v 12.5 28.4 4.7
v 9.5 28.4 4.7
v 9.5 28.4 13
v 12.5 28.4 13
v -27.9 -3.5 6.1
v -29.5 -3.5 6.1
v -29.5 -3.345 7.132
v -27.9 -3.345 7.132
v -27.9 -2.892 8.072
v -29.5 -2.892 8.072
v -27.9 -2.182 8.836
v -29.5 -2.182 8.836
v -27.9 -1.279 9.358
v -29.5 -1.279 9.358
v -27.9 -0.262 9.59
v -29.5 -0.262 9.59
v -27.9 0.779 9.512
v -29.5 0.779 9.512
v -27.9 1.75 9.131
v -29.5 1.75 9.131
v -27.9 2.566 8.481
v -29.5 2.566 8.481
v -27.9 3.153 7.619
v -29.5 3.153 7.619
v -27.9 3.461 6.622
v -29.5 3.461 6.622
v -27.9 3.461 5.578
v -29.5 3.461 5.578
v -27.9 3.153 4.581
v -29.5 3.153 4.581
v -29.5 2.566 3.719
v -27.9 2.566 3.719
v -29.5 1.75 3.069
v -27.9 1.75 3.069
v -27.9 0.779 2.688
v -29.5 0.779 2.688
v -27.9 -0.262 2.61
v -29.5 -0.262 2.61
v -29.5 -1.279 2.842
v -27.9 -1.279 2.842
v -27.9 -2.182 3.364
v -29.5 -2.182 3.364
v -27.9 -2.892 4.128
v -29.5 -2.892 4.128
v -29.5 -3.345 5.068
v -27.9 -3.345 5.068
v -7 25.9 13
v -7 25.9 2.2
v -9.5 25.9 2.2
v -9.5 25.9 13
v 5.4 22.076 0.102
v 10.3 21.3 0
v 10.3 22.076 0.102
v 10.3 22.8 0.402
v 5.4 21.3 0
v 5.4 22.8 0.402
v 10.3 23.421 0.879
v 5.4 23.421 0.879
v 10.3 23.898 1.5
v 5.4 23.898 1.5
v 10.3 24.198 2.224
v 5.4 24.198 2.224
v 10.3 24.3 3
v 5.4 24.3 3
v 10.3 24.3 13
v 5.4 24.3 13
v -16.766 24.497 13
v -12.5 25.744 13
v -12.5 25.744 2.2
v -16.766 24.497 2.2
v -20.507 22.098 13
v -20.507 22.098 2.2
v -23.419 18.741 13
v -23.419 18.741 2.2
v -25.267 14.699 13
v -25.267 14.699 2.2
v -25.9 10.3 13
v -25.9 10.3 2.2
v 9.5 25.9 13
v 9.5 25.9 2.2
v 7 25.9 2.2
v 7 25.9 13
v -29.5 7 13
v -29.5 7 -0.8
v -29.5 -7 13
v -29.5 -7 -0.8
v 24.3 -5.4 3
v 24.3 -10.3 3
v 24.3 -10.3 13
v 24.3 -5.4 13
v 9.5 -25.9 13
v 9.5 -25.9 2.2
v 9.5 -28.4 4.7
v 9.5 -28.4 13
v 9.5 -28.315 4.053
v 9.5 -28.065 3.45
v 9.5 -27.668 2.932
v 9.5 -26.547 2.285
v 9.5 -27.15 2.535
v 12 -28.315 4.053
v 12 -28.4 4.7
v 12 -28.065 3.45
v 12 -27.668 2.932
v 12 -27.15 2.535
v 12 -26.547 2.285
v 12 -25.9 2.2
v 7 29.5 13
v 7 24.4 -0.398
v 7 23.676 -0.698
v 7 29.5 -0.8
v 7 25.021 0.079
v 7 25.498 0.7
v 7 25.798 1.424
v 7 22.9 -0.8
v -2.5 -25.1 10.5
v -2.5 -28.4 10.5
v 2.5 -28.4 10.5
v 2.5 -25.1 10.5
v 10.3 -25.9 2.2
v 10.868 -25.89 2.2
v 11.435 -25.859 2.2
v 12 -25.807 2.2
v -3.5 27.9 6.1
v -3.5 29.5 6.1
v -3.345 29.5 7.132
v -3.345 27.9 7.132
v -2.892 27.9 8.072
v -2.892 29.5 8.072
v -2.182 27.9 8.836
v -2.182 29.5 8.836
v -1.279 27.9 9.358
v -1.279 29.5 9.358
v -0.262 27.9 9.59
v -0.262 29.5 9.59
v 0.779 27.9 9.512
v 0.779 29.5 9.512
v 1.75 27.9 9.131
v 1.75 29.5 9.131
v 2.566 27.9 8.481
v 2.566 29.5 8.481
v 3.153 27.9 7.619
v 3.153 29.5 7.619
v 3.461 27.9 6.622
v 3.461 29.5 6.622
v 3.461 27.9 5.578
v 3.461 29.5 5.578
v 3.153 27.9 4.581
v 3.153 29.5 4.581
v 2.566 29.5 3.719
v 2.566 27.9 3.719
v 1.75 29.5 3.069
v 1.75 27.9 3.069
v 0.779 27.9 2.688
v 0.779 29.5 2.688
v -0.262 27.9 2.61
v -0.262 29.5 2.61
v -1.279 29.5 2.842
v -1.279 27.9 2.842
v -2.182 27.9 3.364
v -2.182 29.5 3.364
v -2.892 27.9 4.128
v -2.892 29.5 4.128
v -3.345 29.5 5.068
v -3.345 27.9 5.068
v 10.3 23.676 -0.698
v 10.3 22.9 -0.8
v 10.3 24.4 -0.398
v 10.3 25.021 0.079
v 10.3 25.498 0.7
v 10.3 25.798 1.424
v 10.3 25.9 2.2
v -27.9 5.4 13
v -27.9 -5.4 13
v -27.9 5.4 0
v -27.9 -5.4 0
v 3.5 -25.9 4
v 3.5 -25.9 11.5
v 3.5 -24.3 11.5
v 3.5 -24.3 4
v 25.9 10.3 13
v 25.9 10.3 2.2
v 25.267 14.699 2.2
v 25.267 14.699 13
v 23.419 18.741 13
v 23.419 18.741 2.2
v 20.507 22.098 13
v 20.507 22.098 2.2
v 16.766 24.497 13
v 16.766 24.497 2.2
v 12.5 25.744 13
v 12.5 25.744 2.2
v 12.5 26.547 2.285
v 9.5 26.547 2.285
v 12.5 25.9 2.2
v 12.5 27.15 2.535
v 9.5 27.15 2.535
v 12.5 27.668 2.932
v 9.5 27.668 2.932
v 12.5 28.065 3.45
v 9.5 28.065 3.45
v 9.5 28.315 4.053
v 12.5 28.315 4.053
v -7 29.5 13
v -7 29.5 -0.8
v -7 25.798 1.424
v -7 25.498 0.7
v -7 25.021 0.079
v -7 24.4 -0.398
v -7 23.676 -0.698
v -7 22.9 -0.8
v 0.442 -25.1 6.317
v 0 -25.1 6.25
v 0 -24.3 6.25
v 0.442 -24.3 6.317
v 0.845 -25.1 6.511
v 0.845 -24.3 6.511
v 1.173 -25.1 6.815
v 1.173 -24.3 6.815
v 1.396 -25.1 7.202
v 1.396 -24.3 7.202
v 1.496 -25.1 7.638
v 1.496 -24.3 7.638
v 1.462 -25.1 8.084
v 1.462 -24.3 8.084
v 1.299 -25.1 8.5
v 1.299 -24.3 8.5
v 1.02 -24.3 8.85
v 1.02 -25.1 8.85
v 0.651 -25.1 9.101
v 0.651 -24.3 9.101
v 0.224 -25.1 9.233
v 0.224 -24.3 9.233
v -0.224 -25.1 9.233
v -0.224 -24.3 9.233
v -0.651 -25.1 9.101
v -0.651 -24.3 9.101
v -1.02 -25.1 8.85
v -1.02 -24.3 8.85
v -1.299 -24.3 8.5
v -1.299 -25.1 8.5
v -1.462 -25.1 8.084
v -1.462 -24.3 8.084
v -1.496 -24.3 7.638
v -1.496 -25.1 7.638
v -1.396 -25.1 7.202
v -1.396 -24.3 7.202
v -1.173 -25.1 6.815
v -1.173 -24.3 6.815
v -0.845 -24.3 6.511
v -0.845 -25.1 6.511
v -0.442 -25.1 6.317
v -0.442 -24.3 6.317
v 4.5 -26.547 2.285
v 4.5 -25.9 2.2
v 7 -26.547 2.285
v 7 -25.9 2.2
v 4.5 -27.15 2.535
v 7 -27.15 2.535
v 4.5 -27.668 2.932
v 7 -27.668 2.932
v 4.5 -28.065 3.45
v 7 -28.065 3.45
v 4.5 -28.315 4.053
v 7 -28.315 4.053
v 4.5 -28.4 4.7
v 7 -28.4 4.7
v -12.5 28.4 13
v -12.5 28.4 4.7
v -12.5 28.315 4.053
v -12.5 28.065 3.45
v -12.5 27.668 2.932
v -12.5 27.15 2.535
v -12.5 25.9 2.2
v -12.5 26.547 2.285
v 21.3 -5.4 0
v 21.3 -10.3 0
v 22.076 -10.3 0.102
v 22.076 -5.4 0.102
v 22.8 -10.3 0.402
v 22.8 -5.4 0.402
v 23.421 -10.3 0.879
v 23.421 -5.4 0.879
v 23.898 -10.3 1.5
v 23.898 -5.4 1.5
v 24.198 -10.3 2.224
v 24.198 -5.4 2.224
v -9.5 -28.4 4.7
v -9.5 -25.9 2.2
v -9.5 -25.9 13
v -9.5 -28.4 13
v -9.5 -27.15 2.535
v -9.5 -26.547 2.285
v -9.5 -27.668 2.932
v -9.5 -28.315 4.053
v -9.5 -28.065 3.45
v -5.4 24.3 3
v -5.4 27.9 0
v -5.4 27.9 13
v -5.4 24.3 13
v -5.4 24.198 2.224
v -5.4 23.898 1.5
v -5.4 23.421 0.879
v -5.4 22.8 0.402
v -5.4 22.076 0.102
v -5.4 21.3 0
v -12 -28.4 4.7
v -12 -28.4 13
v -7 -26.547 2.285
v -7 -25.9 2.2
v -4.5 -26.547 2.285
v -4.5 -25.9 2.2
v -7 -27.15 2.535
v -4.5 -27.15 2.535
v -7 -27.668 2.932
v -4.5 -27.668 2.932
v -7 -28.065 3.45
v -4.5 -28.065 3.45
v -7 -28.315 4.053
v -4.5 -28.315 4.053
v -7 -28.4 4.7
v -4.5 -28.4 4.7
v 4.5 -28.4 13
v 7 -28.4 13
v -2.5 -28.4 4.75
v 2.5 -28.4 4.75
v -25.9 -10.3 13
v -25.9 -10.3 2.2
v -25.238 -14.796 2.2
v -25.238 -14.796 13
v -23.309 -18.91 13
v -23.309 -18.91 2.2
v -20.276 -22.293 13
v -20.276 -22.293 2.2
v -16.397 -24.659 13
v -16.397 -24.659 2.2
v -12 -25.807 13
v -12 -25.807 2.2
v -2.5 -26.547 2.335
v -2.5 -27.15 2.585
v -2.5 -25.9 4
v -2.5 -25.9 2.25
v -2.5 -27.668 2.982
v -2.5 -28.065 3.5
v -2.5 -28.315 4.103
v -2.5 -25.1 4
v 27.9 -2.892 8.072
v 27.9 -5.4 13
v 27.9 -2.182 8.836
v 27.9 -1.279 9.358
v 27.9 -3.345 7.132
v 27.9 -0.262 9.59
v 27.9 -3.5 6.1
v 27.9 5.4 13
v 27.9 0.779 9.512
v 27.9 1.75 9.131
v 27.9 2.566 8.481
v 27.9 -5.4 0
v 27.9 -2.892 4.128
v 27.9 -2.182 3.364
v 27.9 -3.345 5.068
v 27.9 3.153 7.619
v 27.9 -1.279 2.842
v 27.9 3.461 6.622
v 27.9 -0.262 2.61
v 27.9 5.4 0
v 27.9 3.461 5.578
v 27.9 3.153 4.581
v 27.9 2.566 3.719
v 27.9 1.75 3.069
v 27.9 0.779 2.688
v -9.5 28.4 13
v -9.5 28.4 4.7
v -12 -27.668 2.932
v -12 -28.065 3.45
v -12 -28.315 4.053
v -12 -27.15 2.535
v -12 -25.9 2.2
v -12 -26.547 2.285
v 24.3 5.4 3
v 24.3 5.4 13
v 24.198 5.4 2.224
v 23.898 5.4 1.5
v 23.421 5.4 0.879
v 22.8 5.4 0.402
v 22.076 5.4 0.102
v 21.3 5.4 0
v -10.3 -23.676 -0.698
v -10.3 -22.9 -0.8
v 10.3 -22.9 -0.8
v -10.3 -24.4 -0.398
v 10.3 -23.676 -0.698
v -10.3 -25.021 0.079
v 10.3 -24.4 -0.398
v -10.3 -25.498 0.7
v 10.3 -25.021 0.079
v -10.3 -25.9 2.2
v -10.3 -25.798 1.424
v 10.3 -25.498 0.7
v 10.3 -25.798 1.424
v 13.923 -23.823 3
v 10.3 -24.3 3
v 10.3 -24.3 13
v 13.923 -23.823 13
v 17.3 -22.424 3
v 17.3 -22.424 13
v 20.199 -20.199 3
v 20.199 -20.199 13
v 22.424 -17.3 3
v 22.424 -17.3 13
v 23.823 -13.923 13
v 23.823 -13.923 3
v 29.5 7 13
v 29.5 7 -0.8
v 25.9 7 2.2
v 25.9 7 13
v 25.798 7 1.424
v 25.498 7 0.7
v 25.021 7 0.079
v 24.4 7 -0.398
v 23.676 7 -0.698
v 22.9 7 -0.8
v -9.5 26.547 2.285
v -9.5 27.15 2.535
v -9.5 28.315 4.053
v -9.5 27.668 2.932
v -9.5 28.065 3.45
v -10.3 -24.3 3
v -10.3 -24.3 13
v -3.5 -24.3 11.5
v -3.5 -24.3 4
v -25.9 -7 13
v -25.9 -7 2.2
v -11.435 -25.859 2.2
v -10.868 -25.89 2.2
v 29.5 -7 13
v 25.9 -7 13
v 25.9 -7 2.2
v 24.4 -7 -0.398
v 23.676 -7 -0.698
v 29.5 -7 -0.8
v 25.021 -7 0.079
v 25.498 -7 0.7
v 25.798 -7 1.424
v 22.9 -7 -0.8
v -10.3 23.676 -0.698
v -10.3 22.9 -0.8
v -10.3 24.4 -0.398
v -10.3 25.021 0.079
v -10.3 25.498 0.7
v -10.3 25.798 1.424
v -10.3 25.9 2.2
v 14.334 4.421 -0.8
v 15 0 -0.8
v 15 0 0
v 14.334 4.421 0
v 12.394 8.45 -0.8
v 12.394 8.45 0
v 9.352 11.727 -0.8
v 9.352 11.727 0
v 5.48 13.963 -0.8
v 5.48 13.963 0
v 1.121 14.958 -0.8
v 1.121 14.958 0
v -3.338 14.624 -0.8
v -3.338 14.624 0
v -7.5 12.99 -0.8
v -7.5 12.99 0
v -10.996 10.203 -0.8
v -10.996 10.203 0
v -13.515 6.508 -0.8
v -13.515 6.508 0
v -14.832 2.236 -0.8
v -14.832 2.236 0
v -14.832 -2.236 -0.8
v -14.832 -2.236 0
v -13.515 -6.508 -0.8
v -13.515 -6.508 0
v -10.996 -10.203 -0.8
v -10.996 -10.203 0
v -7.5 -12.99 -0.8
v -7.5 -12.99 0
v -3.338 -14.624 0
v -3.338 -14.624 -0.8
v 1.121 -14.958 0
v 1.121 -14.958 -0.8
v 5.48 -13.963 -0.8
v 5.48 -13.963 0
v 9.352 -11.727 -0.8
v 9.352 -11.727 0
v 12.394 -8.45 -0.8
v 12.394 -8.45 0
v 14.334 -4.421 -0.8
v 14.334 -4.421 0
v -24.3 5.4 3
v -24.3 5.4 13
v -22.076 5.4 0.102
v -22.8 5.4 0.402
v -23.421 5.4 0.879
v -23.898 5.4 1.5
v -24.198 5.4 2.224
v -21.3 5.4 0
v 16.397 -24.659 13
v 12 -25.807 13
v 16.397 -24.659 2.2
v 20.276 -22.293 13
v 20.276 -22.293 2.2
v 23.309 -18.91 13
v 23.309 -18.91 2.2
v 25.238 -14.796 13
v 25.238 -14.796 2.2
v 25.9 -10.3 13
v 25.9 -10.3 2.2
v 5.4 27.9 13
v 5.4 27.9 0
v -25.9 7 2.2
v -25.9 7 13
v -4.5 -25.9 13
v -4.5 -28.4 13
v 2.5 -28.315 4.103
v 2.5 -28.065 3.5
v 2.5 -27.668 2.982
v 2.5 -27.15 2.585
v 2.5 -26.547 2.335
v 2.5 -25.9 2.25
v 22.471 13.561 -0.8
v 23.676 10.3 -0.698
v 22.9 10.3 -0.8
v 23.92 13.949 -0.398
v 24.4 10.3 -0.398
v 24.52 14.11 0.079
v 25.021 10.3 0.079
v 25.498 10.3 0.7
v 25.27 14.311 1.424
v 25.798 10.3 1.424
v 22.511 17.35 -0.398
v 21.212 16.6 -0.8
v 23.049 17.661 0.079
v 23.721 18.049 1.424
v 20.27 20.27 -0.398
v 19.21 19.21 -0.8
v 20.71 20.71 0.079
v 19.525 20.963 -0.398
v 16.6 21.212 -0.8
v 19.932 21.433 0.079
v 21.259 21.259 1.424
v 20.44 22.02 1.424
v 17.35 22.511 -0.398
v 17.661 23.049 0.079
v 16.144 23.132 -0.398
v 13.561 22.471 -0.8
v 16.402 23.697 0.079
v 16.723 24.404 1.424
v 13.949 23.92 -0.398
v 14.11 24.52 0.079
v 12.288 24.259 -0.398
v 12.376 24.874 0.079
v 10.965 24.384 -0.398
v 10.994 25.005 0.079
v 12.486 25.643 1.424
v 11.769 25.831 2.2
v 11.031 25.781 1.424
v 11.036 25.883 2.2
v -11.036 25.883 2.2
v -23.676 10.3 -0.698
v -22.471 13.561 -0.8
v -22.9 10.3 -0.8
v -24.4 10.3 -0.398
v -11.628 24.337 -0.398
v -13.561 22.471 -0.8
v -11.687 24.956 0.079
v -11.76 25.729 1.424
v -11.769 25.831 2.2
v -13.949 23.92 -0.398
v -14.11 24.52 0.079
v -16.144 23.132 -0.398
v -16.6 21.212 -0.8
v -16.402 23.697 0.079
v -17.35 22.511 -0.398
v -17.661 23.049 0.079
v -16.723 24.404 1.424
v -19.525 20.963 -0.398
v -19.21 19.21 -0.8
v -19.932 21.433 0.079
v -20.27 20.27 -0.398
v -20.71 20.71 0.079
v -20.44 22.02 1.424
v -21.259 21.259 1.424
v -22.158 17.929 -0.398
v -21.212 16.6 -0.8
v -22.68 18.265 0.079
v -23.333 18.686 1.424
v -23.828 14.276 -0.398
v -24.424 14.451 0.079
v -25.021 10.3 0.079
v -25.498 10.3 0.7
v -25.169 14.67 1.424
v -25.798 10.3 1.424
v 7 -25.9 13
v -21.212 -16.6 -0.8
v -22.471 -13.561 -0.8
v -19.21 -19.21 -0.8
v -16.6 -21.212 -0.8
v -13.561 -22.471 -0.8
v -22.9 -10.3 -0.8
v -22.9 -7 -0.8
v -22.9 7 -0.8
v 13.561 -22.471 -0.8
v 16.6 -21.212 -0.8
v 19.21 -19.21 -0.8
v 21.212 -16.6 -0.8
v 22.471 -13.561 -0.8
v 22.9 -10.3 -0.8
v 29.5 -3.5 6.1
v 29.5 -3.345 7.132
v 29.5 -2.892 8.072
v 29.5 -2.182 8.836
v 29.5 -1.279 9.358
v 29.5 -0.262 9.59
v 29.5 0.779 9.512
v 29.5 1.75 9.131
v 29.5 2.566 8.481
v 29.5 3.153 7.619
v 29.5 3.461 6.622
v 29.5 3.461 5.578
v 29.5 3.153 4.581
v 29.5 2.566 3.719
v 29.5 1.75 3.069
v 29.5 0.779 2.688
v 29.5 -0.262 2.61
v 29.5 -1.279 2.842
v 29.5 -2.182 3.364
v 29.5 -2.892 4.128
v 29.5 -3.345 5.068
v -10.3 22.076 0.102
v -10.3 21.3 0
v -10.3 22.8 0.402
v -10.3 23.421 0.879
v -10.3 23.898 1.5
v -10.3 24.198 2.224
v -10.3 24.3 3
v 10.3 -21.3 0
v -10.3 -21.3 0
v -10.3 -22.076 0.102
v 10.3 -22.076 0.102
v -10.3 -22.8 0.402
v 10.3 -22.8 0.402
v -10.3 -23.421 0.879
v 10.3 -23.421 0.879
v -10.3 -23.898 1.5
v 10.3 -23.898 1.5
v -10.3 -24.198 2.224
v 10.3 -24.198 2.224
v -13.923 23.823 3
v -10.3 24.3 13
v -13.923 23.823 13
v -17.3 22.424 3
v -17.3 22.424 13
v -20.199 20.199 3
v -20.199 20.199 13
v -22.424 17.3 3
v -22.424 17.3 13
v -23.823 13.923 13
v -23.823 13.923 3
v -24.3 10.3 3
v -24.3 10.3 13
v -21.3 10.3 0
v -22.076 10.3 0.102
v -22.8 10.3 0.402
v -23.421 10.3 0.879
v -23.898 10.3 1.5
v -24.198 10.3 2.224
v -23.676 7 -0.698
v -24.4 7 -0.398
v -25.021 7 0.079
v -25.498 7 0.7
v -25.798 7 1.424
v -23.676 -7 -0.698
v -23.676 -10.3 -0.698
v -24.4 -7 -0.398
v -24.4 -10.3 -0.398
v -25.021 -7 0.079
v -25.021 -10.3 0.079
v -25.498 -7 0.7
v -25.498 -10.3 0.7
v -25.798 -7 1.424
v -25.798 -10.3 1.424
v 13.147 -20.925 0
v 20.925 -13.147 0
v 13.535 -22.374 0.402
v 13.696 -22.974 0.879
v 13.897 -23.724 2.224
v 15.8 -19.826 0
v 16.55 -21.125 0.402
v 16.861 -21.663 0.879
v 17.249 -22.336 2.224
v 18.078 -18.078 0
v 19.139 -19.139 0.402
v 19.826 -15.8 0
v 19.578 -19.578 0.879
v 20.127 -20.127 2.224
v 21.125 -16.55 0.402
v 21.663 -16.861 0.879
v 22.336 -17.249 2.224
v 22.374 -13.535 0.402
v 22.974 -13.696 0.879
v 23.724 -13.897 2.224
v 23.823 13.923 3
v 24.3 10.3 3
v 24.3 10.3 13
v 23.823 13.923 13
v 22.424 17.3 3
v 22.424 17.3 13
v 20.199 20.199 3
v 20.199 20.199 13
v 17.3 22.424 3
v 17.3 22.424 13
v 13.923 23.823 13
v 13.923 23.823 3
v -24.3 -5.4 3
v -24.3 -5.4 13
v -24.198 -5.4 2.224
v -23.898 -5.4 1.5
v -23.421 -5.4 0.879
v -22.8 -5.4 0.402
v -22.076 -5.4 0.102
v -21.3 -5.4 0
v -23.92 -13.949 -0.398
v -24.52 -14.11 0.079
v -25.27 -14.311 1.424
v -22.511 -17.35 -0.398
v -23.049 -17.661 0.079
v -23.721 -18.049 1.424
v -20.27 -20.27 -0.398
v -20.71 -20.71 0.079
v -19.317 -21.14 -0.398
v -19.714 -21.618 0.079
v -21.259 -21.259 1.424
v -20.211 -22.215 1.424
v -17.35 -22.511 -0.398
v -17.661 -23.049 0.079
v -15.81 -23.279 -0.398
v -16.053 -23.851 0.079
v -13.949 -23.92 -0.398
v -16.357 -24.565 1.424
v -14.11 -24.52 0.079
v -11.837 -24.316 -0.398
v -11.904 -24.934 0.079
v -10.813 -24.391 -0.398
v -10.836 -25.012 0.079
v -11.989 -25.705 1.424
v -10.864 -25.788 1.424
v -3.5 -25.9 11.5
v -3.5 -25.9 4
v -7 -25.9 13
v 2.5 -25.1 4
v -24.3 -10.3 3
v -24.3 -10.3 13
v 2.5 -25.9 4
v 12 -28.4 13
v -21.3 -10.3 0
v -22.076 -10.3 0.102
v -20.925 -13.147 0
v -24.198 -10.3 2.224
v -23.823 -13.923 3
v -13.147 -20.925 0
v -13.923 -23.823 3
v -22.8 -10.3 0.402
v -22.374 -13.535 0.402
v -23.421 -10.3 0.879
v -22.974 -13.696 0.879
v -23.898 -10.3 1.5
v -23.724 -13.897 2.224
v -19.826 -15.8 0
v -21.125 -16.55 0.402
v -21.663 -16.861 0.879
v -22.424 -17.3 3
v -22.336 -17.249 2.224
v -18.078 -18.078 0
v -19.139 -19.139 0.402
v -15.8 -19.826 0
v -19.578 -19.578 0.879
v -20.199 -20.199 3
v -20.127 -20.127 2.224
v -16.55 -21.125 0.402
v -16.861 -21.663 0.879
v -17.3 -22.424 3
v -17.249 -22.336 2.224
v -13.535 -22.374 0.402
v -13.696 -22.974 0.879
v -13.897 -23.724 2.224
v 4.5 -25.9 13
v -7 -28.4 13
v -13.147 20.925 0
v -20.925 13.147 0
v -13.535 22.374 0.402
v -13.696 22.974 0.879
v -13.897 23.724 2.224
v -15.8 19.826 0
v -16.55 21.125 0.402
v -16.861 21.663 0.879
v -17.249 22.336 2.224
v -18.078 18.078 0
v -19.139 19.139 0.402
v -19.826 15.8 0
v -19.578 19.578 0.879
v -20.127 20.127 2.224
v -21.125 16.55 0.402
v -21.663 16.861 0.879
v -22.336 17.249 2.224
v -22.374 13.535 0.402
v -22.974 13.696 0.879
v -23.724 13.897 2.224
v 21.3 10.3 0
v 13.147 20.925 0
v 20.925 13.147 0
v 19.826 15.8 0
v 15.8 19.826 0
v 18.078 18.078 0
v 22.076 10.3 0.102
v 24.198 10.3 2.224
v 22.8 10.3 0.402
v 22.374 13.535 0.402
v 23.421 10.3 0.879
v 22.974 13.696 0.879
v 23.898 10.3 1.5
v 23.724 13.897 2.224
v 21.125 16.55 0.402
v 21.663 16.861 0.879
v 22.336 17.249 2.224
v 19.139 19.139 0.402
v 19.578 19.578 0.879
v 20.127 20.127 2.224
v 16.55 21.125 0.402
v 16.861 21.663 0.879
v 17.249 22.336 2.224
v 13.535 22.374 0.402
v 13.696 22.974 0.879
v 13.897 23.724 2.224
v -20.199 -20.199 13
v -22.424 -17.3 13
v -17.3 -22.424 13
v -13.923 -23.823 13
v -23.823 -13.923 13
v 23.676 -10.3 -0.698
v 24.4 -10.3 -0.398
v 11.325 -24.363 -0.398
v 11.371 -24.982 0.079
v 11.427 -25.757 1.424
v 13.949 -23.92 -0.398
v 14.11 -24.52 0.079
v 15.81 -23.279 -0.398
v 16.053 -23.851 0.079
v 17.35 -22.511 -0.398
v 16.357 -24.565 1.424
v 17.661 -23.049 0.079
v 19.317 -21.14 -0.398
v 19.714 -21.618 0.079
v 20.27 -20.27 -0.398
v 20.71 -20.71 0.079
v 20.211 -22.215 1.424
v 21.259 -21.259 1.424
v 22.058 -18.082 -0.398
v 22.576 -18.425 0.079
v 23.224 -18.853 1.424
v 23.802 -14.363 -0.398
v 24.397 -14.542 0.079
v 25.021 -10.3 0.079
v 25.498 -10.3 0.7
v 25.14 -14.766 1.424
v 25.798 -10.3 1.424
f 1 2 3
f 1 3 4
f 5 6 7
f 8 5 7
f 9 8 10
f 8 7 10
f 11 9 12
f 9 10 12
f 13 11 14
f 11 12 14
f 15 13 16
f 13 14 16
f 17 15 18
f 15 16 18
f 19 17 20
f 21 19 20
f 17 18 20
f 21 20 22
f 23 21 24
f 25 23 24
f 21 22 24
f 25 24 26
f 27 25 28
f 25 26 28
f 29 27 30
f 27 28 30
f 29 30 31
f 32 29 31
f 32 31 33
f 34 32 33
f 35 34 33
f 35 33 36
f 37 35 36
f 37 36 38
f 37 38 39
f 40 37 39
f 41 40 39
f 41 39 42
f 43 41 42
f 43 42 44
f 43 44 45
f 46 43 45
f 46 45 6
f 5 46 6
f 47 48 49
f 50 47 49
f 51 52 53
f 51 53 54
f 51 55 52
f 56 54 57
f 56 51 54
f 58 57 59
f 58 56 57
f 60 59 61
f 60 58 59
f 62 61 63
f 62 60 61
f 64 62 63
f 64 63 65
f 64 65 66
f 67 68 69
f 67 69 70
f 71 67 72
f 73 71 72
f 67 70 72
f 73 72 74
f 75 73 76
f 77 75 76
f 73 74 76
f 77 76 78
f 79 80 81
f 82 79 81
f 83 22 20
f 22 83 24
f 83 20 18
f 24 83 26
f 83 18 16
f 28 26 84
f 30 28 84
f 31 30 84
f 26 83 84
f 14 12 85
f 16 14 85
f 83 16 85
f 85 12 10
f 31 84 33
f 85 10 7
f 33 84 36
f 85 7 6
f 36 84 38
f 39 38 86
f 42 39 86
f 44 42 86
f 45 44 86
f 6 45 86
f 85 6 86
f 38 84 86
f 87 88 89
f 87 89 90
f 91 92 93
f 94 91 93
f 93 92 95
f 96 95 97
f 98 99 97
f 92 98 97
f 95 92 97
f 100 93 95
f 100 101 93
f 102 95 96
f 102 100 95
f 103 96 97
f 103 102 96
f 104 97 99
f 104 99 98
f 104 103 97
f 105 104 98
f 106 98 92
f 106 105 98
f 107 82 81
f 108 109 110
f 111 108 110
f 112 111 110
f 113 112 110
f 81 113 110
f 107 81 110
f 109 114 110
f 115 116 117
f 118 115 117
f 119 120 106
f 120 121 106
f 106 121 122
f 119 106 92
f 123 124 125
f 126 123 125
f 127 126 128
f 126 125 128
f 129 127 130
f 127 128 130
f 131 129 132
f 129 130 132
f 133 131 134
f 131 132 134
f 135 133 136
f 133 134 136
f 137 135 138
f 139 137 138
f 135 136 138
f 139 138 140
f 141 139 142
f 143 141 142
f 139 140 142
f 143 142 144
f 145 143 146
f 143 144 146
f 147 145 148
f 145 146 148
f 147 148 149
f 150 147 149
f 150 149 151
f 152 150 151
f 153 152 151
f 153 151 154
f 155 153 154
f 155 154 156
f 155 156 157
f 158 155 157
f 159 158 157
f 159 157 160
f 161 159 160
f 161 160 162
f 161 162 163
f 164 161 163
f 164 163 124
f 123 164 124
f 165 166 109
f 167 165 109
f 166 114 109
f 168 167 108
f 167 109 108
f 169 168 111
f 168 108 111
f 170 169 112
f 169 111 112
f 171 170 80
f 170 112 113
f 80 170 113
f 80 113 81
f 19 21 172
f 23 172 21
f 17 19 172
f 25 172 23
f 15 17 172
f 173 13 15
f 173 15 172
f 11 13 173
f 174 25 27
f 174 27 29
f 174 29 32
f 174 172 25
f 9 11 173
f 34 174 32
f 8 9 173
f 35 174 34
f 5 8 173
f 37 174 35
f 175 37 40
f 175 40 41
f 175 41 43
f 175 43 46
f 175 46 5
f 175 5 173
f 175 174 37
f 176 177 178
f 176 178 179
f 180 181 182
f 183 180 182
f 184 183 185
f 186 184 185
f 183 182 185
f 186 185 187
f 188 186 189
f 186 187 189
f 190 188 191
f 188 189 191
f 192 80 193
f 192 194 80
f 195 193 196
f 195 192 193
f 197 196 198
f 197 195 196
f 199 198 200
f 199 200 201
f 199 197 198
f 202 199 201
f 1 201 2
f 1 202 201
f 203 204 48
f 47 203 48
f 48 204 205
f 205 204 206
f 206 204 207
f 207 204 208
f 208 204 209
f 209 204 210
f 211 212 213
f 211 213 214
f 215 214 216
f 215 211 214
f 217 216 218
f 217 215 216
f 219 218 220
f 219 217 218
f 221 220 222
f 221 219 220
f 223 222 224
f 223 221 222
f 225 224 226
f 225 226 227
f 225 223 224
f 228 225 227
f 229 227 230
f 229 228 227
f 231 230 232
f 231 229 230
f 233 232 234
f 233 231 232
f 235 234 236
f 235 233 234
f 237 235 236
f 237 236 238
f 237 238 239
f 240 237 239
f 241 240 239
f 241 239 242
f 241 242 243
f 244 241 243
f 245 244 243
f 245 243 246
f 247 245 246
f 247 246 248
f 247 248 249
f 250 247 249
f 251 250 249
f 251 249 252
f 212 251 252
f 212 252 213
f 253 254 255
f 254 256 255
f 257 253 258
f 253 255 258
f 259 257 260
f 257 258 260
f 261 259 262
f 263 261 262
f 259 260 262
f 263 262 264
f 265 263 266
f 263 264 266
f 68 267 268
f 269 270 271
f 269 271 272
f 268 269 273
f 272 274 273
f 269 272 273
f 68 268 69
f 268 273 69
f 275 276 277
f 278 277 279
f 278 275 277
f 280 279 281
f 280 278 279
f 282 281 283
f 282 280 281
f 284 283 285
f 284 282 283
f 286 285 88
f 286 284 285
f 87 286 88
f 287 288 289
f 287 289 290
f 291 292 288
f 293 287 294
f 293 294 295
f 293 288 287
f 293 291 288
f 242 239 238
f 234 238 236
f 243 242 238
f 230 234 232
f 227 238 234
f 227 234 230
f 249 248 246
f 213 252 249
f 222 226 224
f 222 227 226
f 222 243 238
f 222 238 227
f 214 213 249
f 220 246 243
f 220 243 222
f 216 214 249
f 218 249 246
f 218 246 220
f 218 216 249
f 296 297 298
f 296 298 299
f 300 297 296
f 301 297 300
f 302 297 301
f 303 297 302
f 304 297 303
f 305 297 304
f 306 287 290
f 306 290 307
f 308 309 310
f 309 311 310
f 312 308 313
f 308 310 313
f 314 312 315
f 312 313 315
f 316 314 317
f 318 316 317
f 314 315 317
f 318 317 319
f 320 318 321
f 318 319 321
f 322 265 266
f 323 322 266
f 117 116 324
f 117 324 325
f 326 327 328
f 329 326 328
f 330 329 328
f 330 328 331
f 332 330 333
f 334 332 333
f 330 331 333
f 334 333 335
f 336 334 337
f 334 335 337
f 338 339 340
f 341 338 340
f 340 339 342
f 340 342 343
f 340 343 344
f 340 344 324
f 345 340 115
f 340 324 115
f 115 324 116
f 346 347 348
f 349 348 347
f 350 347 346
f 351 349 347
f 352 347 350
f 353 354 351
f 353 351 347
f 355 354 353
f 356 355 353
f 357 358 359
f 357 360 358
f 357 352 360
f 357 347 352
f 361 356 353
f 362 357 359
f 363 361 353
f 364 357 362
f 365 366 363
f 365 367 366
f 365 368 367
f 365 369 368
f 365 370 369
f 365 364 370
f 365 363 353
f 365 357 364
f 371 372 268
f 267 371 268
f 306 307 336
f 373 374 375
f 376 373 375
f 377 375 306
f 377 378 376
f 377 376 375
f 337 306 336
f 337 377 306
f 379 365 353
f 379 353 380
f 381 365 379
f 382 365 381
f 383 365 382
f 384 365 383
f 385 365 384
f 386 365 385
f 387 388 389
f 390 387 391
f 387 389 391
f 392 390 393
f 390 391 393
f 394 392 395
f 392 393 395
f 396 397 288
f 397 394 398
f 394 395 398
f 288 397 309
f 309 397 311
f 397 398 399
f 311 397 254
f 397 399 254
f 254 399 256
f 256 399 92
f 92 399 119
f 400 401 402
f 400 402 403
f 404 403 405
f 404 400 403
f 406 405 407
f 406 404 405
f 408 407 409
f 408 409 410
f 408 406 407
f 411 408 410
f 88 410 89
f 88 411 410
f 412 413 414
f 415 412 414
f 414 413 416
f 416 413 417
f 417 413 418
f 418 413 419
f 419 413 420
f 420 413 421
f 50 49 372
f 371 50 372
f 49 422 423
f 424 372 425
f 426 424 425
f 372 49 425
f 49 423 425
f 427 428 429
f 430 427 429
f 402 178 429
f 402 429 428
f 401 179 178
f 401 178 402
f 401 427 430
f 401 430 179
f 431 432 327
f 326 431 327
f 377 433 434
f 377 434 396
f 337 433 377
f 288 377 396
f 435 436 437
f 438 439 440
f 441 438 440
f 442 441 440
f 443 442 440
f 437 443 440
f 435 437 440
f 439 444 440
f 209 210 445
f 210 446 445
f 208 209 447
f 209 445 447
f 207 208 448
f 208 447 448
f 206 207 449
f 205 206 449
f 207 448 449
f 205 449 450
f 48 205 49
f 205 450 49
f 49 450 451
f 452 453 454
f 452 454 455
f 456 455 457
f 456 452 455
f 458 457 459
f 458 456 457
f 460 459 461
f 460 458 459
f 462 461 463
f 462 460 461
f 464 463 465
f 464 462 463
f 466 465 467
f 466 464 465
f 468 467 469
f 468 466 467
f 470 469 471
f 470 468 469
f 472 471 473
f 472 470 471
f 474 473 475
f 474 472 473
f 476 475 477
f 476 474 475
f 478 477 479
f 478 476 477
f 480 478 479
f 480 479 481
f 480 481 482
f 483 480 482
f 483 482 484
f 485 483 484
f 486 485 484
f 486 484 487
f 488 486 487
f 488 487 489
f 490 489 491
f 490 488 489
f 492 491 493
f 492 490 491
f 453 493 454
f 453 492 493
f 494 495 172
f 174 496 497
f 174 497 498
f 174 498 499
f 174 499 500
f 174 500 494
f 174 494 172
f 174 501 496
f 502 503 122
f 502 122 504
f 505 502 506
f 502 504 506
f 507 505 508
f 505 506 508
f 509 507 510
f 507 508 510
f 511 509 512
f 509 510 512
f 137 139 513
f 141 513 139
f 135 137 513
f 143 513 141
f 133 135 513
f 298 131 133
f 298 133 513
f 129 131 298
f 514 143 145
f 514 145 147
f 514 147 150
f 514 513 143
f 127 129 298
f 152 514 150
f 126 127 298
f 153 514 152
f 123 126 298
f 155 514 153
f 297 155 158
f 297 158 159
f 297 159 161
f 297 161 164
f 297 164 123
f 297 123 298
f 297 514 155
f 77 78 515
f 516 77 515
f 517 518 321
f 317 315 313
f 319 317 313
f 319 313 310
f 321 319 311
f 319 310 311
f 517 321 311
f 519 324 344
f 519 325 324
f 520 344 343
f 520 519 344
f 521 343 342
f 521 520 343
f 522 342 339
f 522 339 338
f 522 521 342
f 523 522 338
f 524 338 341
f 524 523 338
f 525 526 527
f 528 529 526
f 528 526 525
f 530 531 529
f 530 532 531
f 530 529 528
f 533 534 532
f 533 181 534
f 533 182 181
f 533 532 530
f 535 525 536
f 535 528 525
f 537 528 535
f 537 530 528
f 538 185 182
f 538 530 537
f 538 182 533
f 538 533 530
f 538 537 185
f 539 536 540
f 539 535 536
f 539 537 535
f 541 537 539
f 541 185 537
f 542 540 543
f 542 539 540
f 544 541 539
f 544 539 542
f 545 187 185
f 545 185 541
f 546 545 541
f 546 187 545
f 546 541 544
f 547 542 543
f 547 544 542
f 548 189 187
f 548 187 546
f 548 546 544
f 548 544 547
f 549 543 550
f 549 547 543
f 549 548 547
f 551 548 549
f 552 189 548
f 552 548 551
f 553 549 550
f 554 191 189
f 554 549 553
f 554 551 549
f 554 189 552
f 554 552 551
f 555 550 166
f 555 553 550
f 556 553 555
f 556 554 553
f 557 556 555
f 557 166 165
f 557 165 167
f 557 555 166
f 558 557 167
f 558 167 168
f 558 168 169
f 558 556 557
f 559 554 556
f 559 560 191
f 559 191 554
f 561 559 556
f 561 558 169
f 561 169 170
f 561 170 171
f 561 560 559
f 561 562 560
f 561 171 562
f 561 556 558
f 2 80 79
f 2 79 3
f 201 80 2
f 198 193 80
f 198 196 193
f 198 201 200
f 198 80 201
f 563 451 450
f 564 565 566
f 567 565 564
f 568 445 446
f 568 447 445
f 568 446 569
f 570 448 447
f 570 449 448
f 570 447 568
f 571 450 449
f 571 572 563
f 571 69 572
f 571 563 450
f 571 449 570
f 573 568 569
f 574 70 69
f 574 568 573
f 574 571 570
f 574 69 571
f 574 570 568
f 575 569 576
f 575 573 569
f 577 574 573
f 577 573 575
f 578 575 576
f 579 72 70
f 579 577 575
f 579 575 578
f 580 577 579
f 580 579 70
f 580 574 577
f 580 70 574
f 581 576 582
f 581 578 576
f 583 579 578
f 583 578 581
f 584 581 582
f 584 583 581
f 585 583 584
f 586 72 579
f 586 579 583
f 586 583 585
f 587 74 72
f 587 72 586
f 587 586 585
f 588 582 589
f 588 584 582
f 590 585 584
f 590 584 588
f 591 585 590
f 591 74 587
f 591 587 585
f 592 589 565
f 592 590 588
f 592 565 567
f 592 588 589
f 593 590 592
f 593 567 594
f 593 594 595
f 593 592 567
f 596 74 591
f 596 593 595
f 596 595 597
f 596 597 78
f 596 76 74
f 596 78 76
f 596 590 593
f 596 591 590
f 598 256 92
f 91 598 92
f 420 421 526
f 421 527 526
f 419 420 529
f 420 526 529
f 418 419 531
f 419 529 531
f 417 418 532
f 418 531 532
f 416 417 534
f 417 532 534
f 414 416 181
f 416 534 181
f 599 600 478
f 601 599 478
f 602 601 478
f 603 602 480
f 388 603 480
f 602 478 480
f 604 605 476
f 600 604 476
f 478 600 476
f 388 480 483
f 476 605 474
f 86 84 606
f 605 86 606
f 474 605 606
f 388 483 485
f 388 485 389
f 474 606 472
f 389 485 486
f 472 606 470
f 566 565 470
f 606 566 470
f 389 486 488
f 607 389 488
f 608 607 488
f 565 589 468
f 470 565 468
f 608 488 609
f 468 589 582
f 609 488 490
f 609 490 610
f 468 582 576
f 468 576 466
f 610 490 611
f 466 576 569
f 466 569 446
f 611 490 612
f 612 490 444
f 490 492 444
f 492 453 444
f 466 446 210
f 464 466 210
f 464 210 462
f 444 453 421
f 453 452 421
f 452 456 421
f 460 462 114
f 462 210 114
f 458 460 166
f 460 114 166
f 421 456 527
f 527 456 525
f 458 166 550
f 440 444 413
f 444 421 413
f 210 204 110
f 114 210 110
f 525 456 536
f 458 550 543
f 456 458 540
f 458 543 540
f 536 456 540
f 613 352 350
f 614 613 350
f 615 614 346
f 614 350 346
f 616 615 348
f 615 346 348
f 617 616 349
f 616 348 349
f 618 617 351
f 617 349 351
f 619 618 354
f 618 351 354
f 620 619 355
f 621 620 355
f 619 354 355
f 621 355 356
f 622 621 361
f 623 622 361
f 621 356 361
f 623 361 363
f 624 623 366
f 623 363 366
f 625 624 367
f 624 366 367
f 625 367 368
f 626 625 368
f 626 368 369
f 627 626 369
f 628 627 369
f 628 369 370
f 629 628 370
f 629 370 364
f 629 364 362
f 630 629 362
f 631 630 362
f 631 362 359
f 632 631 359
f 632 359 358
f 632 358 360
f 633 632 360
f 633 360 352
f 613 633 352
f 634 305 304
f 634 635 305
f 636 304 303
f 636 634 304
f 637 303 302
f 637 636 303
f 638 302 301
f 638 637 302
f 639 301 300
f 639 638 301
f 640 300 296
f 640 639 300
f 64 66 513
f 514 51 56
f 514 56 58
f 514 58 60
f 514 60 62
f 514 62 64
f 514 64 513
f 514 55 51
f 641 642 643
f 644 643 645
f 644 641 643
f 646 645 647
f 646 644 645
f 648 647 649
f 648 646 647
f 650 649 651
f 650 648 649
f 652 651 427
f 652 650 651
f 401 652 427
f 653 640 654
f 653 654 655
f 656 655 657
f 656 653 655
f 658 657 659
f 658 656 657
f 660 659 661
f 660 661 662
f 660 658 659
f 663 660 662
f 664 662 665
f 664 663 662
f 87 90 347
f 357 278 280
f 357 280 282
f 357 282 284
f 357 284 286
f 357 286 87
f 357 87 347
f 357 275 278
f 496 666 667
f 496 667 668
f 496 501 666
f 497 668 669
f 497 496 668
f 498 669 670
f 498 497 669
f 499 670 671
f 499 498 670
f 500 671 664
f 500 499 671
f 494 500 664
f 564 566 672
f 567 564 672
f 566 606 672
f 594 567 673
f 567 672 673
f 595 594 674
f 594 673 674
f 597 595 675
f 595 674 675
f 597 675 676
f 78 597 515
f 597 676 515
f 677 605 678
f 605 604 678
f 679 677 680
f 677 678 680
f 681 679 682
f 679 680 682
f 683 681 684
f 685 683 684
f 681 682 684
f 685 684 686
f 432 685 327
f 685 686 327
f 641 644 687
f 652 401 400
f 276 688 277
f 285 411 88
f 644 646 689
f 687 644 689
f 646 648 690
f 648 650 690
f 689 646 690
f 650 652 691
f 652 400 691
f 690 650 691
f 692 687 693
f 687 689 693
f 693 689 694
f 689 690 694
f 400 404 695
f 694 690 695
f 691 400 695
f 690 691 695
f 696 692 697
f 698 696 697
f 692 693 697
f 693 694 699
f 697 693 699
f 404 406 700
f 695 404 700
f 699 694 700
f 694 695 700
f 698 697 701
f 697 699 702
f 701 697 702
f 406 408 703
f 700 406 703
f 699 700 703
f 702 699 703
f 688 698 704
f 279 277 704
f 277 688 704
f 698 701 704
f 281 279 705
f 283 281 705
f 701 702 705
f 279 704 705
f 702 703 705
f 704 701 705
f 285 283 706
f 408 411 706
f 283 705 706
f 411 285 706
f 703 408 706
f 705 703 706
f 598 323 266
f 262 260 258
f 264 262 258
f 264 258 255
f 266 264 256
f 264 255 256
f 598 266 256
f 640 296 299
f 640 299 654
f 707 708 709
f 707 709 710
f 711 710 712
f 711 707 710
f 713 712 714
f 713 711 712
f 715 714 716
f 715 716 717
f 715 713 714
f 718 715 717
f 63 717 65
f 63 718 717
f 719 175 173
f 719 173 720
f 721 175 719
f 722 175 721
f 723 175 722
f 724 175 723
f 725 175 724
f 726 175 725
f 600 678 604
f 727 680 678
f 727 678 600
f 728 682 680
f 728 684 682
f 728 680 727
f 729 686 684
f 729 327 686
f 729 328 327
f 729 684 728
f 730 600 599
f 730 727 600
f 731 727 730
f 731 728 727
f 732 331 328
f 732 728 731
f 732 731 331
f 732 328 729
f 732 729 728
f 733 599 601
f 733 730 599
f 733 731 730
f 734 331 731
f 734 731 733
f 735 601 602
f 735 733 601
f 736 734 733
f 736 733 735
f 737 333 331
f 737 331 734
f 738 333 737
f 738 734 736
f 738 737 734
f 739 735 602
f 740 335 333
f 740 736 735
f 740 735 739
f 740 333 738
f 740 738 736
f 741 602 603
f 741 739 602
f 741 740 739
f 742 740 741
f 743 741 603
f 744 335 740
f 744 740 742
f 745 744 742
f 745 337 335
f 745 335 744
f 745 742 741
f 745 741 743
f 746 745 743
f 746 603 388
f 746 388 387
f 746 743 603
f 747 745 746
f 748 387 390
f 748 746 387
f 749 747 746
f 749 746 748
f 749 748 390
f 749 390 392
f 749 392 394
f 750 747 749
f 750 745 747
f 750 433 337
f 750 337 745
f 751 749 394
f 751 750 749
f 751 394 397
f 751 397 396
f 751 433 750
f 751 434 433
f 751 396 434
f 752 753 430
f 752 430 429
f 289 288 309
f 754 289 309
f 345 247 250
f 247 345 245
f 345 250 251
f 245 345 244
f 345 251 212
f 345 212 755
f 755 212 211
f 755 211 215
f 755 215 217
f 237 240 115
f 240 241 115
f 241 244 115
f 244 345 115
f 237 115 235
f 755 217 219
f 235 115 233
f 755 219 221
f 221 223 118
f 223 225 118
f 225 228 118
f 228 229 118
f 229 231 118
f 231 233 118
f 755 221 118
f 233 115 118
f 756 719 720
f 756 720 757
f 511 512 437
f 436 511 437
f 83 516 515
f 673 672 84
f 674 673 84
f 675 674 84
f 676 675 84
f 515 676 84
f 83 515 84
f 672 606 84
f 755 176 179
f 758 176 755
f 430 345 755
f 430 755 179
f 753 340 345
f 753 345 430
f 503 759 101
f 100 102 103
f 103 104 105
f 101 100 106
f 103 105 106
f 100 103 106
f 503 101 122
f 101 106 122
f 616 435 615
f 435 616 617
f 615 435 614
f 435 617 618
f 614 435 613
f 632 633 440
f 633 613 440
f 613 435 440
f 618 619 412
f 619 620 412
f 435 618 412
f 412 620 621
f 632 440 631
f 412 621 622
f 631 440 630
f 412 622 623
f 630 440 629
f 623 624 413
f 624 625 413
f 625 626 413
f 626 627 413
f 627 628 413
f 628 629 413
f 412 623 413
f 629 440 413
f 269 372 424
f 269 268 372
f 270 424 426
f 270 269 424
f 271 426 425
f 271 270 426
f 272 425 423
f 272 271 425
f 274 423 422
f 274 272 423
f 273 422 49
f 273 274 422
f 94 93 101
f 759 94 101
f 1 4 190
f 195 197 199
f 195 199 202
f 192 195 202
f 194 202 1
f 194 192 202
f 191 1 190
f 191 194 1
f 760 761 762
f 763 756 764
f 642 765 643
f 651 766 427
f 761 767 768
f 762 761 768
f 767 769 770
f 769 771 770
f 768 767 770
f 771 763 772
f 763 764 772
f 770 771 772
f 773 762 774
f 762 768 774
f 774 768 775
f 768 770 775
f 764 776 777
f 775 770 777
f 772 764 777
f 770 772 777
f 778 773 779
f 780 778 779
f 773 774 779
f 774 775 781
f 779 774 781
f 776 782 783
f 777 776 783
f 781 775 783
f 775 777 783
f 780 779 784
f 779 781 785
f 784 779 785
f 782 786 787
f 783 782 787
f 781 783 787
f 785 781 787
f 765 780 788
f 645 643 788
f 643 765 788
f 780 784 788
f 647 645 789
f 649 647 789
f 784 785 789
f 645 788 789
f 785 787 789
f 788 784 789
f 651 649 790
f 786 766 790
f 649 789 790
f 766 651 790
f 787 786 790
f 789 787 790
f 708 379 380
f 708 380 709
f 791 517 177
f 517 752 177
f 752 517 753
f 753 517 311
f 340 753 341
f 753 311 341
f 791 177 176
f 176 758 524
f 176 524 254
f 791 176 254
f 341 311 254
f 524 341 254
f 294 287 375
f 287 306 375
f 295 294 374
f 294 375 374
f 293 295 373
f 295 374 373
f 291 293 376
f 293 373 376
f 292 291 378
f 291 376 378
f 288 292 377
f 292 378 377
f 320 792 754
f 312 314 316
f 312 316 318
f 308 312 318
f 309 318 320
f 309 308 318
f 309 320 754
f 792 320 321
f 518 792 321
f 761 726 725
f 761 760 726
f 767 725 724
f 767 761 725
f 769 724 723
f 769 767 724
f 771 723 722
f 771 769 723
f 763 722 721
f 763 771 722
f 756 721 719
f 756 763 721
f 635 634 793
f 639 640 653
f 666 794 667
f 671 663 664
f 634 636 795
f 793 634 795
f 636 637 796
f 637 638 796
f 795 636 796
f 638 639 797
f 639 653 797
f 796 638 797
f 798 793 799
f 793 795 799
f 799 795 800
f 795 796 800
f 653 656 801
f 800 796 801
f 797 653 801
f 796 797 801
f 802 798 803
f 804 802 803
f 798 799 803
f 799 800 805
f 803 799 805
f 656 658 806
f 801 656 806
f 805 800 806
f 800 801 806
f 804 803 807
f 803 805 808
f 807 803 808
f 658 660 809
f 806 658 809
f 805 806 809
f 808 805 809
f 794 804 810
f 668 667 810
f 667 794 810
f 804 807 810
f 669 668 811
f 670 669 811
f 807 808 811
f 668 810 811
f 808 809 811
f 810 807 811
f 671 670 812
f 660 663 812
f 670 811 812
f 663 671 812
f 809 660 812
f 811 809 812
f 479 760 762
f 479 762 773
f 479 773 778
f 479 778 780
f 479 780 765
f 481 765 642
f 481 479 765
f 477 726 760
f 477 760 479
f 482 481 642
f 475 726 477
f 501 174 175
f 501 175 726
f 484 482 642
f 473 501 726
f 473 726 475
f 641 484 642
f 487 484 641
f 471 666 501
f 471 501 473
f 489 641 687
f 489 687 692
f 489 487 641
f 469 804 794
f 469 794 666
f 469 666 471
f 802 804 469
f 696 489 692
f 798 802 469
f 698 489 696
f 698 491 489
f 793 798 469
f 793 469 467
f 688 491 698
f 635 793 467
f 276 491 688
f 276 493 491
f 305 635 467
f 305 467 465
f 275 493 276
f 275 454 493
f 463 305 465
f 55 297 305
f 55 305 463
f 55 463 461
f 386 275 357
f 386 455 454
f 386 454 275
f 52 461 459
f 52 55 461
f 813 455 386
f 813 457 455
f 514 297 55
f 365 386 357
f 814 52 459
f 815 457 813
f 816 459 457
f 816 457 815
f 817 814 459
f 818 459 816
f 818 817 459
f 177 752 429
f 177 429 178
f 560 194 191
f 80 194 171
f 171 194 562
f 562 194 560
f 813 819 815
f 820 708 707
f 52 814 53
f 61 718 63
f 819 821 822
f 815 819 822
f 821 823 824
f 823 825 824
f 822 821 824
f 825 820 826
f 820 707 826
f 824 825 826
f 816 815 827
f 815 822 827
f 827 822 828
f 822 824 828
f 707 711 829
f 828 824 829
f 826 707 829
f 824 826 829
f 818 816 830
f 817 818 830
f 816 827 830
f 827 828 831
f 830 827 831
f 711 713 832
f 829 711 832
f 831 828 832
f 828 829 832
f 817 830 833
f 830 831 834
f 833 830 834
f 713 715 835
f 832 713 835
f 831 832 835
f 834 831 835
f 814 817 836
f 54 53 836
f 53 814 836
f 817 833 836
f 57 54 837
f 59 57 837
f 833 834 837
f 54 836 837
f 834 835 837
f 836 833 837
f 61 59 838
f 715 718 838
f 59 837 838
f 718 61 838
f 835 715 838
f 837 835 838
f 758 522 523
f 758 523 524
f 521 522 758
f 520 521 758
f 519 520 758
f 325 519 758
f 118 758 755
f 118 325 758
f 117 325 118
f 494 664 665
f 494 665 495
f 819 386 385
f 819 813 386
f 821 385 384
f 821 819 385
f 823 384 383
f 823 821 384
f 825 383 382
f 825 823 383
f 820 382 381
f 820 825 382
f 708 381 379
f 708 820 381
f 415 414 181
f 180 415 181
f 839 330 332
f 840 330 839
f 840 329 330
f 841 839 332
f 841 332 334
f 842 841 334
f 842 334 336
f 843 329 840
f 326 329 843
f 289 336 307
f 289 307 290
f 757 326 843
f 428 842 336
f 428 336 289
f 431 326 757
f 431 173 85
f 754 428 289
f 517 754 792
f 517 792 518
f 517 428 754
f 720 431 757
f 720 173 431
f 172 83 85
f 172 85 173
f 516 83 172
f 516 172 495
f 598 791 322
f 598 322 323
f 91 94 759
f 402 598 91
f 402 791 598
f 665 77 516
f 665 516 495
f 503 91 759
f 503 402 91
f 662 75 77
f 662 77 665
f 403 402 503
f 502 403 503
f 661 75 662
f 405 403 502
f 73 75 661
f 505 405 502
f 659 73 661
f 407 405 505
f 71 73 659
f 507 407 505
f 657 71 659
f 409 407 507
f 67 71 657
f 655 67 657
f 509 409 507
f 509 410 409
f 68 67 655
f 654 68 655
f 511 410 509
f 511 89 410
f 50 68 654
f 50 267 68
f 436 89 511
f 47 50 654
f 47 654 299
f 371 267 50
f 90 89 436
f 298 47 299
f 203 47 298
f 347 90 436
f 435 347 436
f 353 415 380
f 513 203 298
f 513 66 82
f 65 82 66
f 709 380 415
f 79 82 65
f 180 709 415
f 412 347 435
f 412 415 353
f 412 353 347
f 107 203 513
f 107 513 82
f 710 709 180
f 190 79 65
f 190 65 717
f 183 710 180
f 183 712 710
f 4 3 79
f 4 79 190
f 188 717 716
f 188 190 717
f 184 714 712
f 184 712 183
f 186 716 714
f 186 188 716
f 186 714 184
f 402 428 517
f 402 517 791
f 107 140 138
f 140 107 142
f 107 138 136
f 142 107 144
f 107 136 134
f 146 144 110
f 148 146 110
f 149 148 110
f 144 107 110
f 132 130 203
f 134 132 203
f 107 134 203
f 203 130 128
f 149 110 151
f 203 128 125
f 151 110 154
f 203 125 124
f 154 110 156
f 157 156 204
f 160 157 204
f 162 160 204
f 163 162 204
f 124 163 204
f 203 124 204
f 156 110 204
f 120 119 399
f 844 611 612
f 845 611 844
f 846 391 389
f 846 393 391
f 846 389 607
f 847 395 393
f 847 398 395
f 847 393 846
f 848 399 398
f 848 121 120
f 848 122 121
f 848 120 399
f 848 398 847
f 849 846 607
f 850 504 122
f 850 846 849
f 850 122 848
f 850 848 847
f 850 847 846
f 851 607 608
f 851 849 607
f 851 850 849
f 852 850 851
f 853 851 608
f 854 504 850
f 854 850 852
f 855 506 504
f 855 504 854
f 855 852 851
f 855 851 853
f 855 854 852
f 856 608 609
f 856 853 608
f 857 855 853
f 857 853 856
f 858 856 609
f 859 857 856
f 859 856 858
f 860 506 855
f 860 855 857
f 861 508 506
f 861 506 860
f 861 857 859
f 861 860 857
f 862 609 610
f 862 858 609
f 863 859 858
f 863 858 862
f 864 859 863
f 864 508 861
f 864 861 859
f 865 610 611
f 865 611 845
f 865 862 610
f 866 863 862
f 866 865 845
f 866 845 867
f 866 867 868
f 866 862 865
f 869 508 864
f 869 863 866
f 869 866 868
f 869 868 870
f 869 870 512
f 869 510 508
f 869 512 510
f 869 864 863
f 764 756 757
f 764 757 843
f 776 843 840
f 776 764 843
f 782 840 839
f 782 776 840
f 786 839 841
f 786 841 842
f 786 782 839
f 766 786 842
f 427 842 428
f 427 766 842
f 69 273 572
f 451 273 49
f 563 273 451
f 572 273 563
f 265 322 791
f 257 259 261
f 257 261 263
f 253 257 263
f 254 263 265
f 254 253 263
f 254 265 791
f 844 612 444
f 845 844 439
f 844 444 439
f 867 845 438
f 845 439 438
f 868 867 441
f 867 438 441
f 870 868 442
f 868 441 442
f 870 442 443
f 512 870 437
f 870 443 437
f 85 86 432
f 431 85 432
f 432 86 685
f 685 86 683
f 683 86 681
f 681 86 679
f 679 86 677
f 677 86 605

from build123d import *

# Parameters (mm, degrees)
EXTRUDE_1487_DEPTH     = 13
EXTRUDE_START          = -0.8
SKETCH_8_R             = 15
EXTRUDE_1654_DEPTH     = 0.8
CUT_EXTRUDE_1920_REACH = 69.233
SKETCH_1784_R          = 3.5
CUT_EXTRUDE_2148_REACH = 66.097
SKETCH_2017_R          = 3.5
CUT_EXTRUDE_2773_REACH = 66.097
CUT_EXTRUDE_2851_REACH = 66.897
CUT_EXTRUDE_START      = -0.8
SKETCH_3_W             = 5
SKETCH_3_H             = 6.5
SKETCH_3_R             = 1.5
FILLET_3030_R          = 3
FILLET_3594_R          = 3
EXTRUDE_START_2        = 2.2
SKETCH_4254_W          = 2.5
SKETCH_4254_H          = 2.5
EXTRUDE_4621_DEPTH     = 10.8
EXTRUDE_START_3        = 2.5
SKETCH_5_W             = 5
SKETCH_5_H             = 1.75
SKETCH_5_H_2           = 6.5
SKETCH_5_R             = 1.5
EXTRUDE_4751_DEPTH     = 2.5
FILLET_1_R             = 2.5


with BuildPart() as part:
    # Sketch 348 → Extrude 1487 (new body)
    with BuildSketch(Plane.XY):
        with BuildLine():
            Line((-10.3, -25.9), (10.3, -25.9))
            ThreePointArc((10.3, -25.9), (21.330865787, -21.330865787), (25.9, -10.3))
            Line((25.9, -10.3), (25.9, -7))
            Line((25.9, -7), (29.5, -7))
            Line((29.5, -7), (29.5, 7))
            Line((29.5, 7), (25.9, 7))
            Line((25.9, 7), (25.9, 10.3))
            ThreePointArc((25.9, 10.3), (21.330865787, 21.330865787), (10.3, 25.9))
            Line((10.3, 25.9), (7, 25.9))
            Line((7, 25.9), (7, 29.5))
            Line((7, 29.5), (-7, 29.5))
            Line((-7, 29.5), (-7, 25.9))
            Line((-7, 25.9), (-10.3, 25.9))
            ThreePointArc((-10.3, 25.9), (-21.330865787, 21.330865787), (-25.9, 10.3))
            Line((-25.9, 10.3), (-25.9, 7))
            Line((-25.9, 7), (-29.5, 7))
            Line((-29.5, 7), (-29.5, -7))
            Line((-29.5, -7), (-25.9, -7))
            Line((-25.9, -7), (-25.9, -10.3))
            ThreePointArc((-25.9, -10.3), (-21.330865787, -21.330865787), (-10.3, -25.9))
        make_face()
        with BuildLine():
            Line((-10.3, -24.3), (10.3, -24.3))
            ThreePointArc((10.3, -24.3), (20.199494937, -20.199494937), (24.3, -10.3))
            Line((24.3, -10.3), (24.3, -5.4))
            Line((24.3, -5.4), (27.9, -5.4))
            Line((27.9, -5.4), (27.9, 5.4))
            Line((27.9, 5.4), (24.3, 5.4))
            Line((24.3, 5.4), (24.3, 10.3))
            ThreePointArc((24.3, 10.3), (20.199494937, 20.199494937), (10.3, 24.3))
            Line((10.3, 24.3), (5.4, 24.3))
            Line((5.4, 24.3), (5.4, 27.9))
            Line((5.4, 27.9), (-5.4, 27.9))
            Line((-5.4, 27.9), (-5.4, 24.3))
            Line((-5.4, 24.3), (-10.3, 24.3))
            ThreePointArc((-10.3, 24.3), (-20.199494937, 20.199494937), (-24.3, 10.3))
            Line((-24.3, 10.3), (-24.3, 5.4))
            Line((-24.3, 5.4), (-27.9, 5.4))
            Line((-27.9, 5.4), (-27.9, -5.4))
            Line((-27.9, -5.4), (-24.3, -5.4))
            Line((-24.3, -5.4), (-24.3, -10.3))
            ThreePointArc((-24.3, -10.3), (-20.199494937, -20.199494937), (-10.3, -24.3))
        make_face(mode=Mode.SUBTRACT)
    extrude(amount=EXTRUDE_1487_DEPTH)

    # Эскиз-База<8> → Extrude 1654 (add)
    with BuildSketch(Plane.XY.offset(EXTRUDE_START)):
        with BuildLine():
            Line((-25.9, 7), (-29.5, 7))
            Line((-29.5, 7), (-29.5, -7))
            Line((-29.5, -7), (-25.9, -7))
            Line((-25.9, -7), (-25.9, -10.3))
            ThreePointArc((-25.9, -10.3), (-21.330865787, -21.330865787), (-10.3, -25.9))
            Line((-10.3, -25.9), (10.3, -25.9))
            ThreePointArc((10.3, -25.9), (21.330865787, -21.330865787), (25.9, -10.3))
            Line((25.9, -10.3), (25.9, -7))
            Line((25.9, -7), (29.5, -7))
            Line((29.5, -7), (29.5, 7))
            Line((29.5, 7), (25.9, 7))
            Line((25.9, 7), (25.9, 10.3))
            ThreePointArc((25.9, 10.3), (21.330865787, 21.330865787), (10.3, 25.9))
            Line((10.3, 25.9), (7, 25.9))
            Line((7, 25.9), (7, 29.5))
            Line((7, 29.5), (-7, 29.5))
            Line((-7, 29.5), (-7, 25.9))
            Line((-7, 25.9), (-10.3, 25.9))
            ThreePointArc((-10.3, 25.9), (-21.330865787, 21.330865787), (-25.9, 10.3))
            Line((-25.9, 10.3), (-25.9, 7))
        make_face()
        Circle(SKETCH_8_R, mode=Mode.SUBTRACT)
    extrude(amount=EXTRUDE_1654_DEPTH)

    # Sketch 1784 → Cut-Extrude 1920 (cut, up to next)
    with BuildSketch(Plane.ZY.offset(29.5), mode=Mode.PRIVATE) as cut_extrude_1920_sk1:
        with Locations(Location((6.1, 0, 0), (0, 0, 270))):
            Circle(SKETCH_1784_R)
    cut_extrude_1920_tool1 = extrude(cut_extrude_1920_sk1.sketch, amount=-CUT_EXTRUDE_1920_REACH, mode=Mode.PRIVATE) & part.part
    add(cut_extrude_1920_tool1.solids().sort_by_distance((-29.5, 0, 6.1))[0], mode=Mode.SUBTRACT)
    add(cut_extrude_1920_tool1.solids().sort_by_distance((-29.5, 0, 6.1))[1], mode=Mode.SUBTRACT)

    # Sketch 2017 → Cut-Extrude 2148 (cut, up to next)
    with BuildSketch(Plane(origin=(0, 29.5, 0), x_dir=(1, 0, 0), z_dir=(0, 1, 0)), mode=Mode.PRIVATE) as cut_extrude_2148_sk1:
        with Locations(Location((0, -6.1, 0), (0, 0, 180))):
            Circle(SKETCH_2017_R)
    cut_extrude_2148_tool1 = extrude(cut_extrude_2148_sk1.sketch, amount=-CUT_EXTRUDE_2148_REACH, mode=Mode.PRIVATE) & part.part
    add(cut_extrude_2148_tool1.solids().sort_by_distance((0, 29.5, 6.1))[0], mode=Mode.SUBTRACT)

    # Sketch 2270 → Cut-Extrude 2773 (cut, up to next)
    with BuildSketch(Plane.XZ.offset(25.9), mode=Mode.PRIVATE) as cut_extrude_2773_sk1:
        Polygon((3.5, 11.5), (3.5, 4), (2.5, 4), (2.5, 10.5), (-2.5, 10.5), (-2.5, 4), (-3.5, 4), (-3.5, 11.5), align=None)
    cut_extrude_2773_tool1 = extrude(cut_extrude_2773_sk1.sketch, amount=-CUT_EXTRUDE_2773_REACH, mode=Mode.PRIVATE) & part.part
    add(cut_extrude_2773_tool1.solids().sort_by_distance((3.397409, -25.9, 7.75))[0], mode=Mode.SUBTRACT)

    # Эскиз-Кнопка записи<3> → Cut-Extrude 2851 (cut, up to next)
    with BuildSketch(Plane.XZ.offset(25.9).offset(CUT_EXTRUDE_START), mode=Mode.PRIVATE) as cut_extrude_2851_sk1:
        with Locations((0, 7.25)):
            Rectangle(SKETCH_3_W, SKETCH_3_H)
        with Locations(Location((0, 7.75, 0), (0, 0, 270))):
            Circle(SKETCH_3_R, mode=Mode.SUBTRACT)
    cut_extrude_2851_tool1 = extrude(cut_extrude_2851_sk1.sketch, amount=-CUT_EXTRUDE_2851_REACH, mode=Mode.PRIVATE) & part.part
    add(cut_extrude_2851_tool1.solids().sort_by_distance((-2.417994, -25.1, 7.25))[0], mode=Mode.SUBTRACT)

    # Fillet 3030
    fillet_3030_edges = [part.edges().sort_by_distance(p)[0] for p in [
        (-7.85, 24.3, 0),
        (-20.199494937, 20.199494937, 0),
        (-24.3, -7.85, 0),
        (-20.199494937, -20.199494937, 0),
        (20.199494937, -20.199494937, 0),
        (20.199494937, 20.199494937, 0),
        (7.85, 24.3, 0),
        (24.3, 7.85, 0),
        (24.3, -7.85, 0),
        (0, -24.3, 0),
        (-24.3, 7.85, 0),
    ]]
    fillet(fillet_3030_edges, radius=FILLET_3030_R)

    # Fillet 3594
    fillet_3594_edges = [part.edges().sort_by_distance(p)[0] for p in [
        (-21.330865787, 21.330865787, -0.8),
        (-8.65, 25.9, -0.8),
        (8.65, 25.9, -0.8),
        (21.330865787, 21.330865787, -0.8),
        (25.9, 8.65, -0.8),
        (25.9, -8.65, -0.8),
        (21.330865787, -21.330865787, -0.8),
        (0, -25.9, -0.8),
        (-21.330865787, -21.330865787, -0.8),
        (-25.9, -8.65, -0.8),
        (-25.9, 8.65, -0.8),
    ]]
    fillet(fillet_3594_edges, radius=FILLET_3594_R)

    # Sketch 4254 → Extrude 4621 (add)
    with BuildSketch(Plane.XY.offset(EXTRUDE_START_2)):
        Polygon((-9.5, 25.9), (-9.5, 28.4), (-12.5, 28.4), (-12.5, 25.4), align=None)
        Polygon((12, -25.4), (9.5, -25.9), (9.5, -28.4), (12, -28.4), align=None)
        Polygon((9.5, 25.9), (9.5, 28.4), (12.5, 28.4), (12.5, 25.4), align=None)
        Polygon((-9.5, -25.9), (-9.5, -28.4), (-12, -28.4), (-12, -25.4), align=None)
        with Locations((-5.75, -27.15)):
            Rectangle(SKETCH_4254_W, SKETCH_4254_H)
        with Locations((5.75, -27.15)):
            Rectangle(SKETCH_4254_W, SKETCH_4254_H)
    extrude(amount=EXTRUDE_4621_DEPTH)

    # Эскиз-Кнопка записи<5> → Extrude 4751 (add)
    # profile 1 of 3: a face of its own
    with BuildSketch(Plane.XZ.offset(25.9).offset(EXTRUDE_START_3)):
        with Locations((0, 3.125)):
            Rectangle(SKETCH_5_W, SKETCH_5_H)
    # profile 2 of 3: a face of its own
    with BuildSketch(Plane.XZ.offset(25.9).offset(EXTRUDE_START_3)):
        with Locations((0, 7.25)):
            Rectangle(SKETCH_5_W, SKETCH_5_H_2)
        with Locations(Location((0, 7.75, 0), (0, 0, 270))):
            Circle(SKETCH_5_R, mode=Mode.SUBTRACT)
    # profile 3 of 3: a face of its own
    with BuildSketch(Plane.XZ.offset(25.9).offset(EXTRUDE_START_3)):
        with Locations(Location((0, 7.75, 0), (0, 0, 270))):
            Circle(SKETCH_5_R)
    extrude(amount=-EXTRUDE_4751_DEPTH)

    # Скругление1
    fillet_1_edges = [part.edges().sort_by_distance(p)[0] for p in [
        (10.75, -28.4, 2.2),
        (5.75, -28.4, 2.2),
        (-10.75, -28.4, 2.2),
        (-5.75, -28.4, 2.2),
        (0, -28.4, 2.25),
        (11, 28.4, 2.2),
        (-11, 28.4, 2.2),
    ]]
    fillet(fillet_1_edges, radius=FILLET_1_R - 0.0001)  # a hair under: the kernel refuses the full size


solid = part.part
